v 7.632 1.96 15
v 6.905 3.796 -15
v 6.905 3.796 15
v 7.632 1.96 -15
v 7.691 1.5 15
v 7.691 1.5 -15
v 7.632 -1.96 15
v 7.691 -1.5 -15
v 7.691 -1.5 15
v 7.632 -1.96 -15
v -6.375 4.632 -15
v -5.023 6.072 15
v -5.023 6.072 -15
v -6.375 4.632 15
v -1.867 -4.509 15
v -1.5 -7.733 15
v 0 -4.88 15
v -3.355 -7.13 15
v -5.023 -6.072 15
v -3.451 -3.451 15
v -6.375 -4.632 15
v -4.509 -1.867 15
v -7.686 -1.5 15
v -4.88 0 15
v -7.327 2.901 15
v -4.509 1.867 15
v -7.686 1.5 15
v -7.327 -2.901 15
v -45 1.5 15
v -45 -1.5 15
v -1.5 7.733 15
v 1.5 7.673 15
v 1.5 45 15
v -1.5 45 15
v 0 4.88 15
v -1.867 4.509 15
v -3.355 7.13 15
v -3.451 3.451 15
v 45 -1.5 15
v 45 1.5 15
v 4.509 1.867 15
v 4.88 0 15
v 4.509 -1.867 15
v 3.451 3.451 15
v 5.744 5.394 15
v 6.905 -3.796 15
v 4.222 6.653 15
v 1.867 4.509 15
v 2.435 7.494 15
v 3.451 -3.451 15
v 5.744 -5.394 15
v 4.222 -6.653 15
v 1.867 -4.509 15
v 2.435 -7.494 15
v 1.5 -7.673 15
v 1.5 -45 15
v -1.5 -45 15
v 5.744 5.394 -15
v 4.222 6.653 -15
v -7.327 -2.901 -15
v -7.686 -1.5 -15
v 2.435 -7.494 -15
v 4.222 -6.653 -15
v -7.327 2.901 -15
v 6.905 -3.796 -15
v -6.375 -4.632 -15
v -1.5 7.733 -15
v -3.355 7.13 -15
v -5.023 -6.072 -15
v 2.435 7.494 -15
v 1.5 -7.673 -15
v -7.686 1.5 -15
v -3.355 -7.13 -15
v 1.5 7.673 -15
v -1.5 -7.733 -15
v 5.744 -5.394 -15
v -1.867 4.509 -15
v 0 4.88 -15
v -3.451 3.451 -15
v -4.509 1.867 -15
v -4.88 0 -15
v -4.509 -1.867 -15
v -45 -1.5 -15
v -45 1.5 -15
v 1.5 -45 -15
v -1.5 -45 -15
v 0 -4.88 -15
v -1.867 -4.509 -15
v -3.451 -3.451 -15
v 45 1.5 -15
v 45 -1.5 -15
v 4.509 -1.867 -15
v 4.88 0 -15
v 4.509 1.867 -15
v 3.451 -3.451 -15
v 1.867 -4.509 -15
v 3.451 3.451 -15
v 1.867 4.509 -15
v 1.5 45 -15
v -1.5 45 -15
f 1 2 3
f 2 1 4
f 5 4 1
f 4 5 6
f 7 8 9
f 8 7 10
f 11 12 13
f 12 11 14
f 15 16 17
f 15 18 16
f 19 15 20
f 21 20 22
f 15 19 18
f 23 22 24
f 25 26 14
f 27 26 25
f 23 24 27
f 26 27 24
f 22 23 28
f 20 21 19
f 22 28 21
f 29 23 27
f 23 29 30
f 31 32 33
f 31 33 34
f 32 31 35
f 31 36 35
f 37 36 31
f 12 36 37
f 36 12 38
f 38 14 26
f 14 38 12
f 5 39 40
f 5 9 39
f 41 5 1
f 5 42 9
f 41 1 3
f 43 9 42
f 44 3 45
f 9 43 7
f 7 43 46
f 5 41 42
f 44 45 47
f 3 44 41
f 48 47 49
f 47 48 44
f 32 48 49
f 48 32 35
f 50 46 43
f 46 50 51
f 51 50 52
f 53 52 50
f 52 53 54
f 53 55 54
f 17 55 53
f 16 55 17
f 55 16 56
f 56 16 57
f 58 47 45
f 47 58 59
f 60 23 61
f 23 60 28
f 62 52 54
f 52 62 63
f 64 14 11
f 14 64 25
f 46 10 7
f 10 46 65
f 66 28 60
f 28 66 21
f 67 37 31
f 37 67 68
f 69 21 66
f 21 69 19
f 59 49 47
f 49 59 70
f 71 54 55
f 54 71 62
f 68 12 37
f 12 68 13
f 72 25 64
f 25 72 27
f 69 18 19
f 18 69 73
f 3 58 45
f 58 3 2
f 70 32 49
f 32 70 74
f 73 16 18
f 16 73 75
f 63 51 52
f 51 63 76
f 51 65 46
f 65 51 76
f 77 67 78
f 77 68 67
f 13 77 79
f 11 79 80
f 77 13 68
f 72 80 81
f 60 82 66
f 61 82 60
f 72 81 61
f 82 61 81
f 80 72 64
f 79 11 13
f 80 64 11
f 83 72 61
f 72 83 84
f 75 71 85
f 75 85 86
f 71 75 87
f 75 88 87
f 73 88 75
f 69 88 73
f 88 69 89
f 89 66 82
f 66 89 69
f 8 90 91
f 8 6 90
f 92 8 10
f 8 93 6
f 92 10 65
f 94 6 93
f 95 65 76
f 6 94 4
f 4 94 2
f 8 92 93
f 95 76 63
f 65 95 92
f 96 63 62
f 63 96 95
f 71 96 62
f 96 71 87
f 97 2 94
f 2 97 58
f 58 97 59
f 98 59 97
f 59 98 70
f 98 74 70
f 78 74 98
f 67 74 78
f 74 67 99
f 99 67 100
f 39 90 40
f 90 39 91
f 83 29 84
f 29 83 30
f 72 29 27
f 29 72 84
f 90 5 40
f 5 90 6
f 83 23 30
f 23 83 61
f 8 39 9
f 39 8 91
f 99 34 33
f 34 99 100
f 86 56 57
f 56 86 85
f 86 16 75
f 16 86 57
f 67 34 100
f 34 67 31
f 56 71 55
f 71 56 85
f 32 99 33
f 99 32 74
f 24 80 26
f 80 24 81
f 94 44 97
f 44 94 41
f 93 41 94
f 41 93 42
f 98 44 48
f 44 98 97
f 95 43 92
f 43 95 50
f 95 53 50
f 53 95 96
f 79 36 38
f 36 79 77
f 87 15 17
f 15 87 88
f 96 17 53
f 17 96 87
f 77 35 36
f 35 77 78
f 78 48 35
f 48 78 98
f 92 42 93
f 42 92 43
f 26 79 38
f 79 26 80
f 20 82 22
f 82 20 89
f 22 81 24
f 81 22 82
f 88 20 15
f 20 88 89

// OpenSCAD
height = 30;
radius = 4.88;
fin_len = 90;

difference () {
     union() {
	  cylinder (h=height, r=radius+3, center=true);
	  rotate(0) cube([fin_len,3,height], center=true);
	  rotate(90) cube([fin_len,3,height], center=true);
     }
     cylinder (h=height+1, r=radius, center=true);
}
     
/*
difference () {
     cylinder (h=height, r=radius+3, center=true);
     cylinder (h=height+1, r=radius, center=true);
     }

translate([(fin_len/2)+radius,(fin_len/2)-radius,0]) rotate(30) cube([fin_len,3,height], center=true);
translate([-(fin_len/2)-radius,(fin_len/2)-radius,0]) rotate(-30) cube([fin_len,3,height], center=true);

translate([0,-(fin_len/2)-radius,0]) rotate(90) cube([fin_len,3,height], center=true);
*/
